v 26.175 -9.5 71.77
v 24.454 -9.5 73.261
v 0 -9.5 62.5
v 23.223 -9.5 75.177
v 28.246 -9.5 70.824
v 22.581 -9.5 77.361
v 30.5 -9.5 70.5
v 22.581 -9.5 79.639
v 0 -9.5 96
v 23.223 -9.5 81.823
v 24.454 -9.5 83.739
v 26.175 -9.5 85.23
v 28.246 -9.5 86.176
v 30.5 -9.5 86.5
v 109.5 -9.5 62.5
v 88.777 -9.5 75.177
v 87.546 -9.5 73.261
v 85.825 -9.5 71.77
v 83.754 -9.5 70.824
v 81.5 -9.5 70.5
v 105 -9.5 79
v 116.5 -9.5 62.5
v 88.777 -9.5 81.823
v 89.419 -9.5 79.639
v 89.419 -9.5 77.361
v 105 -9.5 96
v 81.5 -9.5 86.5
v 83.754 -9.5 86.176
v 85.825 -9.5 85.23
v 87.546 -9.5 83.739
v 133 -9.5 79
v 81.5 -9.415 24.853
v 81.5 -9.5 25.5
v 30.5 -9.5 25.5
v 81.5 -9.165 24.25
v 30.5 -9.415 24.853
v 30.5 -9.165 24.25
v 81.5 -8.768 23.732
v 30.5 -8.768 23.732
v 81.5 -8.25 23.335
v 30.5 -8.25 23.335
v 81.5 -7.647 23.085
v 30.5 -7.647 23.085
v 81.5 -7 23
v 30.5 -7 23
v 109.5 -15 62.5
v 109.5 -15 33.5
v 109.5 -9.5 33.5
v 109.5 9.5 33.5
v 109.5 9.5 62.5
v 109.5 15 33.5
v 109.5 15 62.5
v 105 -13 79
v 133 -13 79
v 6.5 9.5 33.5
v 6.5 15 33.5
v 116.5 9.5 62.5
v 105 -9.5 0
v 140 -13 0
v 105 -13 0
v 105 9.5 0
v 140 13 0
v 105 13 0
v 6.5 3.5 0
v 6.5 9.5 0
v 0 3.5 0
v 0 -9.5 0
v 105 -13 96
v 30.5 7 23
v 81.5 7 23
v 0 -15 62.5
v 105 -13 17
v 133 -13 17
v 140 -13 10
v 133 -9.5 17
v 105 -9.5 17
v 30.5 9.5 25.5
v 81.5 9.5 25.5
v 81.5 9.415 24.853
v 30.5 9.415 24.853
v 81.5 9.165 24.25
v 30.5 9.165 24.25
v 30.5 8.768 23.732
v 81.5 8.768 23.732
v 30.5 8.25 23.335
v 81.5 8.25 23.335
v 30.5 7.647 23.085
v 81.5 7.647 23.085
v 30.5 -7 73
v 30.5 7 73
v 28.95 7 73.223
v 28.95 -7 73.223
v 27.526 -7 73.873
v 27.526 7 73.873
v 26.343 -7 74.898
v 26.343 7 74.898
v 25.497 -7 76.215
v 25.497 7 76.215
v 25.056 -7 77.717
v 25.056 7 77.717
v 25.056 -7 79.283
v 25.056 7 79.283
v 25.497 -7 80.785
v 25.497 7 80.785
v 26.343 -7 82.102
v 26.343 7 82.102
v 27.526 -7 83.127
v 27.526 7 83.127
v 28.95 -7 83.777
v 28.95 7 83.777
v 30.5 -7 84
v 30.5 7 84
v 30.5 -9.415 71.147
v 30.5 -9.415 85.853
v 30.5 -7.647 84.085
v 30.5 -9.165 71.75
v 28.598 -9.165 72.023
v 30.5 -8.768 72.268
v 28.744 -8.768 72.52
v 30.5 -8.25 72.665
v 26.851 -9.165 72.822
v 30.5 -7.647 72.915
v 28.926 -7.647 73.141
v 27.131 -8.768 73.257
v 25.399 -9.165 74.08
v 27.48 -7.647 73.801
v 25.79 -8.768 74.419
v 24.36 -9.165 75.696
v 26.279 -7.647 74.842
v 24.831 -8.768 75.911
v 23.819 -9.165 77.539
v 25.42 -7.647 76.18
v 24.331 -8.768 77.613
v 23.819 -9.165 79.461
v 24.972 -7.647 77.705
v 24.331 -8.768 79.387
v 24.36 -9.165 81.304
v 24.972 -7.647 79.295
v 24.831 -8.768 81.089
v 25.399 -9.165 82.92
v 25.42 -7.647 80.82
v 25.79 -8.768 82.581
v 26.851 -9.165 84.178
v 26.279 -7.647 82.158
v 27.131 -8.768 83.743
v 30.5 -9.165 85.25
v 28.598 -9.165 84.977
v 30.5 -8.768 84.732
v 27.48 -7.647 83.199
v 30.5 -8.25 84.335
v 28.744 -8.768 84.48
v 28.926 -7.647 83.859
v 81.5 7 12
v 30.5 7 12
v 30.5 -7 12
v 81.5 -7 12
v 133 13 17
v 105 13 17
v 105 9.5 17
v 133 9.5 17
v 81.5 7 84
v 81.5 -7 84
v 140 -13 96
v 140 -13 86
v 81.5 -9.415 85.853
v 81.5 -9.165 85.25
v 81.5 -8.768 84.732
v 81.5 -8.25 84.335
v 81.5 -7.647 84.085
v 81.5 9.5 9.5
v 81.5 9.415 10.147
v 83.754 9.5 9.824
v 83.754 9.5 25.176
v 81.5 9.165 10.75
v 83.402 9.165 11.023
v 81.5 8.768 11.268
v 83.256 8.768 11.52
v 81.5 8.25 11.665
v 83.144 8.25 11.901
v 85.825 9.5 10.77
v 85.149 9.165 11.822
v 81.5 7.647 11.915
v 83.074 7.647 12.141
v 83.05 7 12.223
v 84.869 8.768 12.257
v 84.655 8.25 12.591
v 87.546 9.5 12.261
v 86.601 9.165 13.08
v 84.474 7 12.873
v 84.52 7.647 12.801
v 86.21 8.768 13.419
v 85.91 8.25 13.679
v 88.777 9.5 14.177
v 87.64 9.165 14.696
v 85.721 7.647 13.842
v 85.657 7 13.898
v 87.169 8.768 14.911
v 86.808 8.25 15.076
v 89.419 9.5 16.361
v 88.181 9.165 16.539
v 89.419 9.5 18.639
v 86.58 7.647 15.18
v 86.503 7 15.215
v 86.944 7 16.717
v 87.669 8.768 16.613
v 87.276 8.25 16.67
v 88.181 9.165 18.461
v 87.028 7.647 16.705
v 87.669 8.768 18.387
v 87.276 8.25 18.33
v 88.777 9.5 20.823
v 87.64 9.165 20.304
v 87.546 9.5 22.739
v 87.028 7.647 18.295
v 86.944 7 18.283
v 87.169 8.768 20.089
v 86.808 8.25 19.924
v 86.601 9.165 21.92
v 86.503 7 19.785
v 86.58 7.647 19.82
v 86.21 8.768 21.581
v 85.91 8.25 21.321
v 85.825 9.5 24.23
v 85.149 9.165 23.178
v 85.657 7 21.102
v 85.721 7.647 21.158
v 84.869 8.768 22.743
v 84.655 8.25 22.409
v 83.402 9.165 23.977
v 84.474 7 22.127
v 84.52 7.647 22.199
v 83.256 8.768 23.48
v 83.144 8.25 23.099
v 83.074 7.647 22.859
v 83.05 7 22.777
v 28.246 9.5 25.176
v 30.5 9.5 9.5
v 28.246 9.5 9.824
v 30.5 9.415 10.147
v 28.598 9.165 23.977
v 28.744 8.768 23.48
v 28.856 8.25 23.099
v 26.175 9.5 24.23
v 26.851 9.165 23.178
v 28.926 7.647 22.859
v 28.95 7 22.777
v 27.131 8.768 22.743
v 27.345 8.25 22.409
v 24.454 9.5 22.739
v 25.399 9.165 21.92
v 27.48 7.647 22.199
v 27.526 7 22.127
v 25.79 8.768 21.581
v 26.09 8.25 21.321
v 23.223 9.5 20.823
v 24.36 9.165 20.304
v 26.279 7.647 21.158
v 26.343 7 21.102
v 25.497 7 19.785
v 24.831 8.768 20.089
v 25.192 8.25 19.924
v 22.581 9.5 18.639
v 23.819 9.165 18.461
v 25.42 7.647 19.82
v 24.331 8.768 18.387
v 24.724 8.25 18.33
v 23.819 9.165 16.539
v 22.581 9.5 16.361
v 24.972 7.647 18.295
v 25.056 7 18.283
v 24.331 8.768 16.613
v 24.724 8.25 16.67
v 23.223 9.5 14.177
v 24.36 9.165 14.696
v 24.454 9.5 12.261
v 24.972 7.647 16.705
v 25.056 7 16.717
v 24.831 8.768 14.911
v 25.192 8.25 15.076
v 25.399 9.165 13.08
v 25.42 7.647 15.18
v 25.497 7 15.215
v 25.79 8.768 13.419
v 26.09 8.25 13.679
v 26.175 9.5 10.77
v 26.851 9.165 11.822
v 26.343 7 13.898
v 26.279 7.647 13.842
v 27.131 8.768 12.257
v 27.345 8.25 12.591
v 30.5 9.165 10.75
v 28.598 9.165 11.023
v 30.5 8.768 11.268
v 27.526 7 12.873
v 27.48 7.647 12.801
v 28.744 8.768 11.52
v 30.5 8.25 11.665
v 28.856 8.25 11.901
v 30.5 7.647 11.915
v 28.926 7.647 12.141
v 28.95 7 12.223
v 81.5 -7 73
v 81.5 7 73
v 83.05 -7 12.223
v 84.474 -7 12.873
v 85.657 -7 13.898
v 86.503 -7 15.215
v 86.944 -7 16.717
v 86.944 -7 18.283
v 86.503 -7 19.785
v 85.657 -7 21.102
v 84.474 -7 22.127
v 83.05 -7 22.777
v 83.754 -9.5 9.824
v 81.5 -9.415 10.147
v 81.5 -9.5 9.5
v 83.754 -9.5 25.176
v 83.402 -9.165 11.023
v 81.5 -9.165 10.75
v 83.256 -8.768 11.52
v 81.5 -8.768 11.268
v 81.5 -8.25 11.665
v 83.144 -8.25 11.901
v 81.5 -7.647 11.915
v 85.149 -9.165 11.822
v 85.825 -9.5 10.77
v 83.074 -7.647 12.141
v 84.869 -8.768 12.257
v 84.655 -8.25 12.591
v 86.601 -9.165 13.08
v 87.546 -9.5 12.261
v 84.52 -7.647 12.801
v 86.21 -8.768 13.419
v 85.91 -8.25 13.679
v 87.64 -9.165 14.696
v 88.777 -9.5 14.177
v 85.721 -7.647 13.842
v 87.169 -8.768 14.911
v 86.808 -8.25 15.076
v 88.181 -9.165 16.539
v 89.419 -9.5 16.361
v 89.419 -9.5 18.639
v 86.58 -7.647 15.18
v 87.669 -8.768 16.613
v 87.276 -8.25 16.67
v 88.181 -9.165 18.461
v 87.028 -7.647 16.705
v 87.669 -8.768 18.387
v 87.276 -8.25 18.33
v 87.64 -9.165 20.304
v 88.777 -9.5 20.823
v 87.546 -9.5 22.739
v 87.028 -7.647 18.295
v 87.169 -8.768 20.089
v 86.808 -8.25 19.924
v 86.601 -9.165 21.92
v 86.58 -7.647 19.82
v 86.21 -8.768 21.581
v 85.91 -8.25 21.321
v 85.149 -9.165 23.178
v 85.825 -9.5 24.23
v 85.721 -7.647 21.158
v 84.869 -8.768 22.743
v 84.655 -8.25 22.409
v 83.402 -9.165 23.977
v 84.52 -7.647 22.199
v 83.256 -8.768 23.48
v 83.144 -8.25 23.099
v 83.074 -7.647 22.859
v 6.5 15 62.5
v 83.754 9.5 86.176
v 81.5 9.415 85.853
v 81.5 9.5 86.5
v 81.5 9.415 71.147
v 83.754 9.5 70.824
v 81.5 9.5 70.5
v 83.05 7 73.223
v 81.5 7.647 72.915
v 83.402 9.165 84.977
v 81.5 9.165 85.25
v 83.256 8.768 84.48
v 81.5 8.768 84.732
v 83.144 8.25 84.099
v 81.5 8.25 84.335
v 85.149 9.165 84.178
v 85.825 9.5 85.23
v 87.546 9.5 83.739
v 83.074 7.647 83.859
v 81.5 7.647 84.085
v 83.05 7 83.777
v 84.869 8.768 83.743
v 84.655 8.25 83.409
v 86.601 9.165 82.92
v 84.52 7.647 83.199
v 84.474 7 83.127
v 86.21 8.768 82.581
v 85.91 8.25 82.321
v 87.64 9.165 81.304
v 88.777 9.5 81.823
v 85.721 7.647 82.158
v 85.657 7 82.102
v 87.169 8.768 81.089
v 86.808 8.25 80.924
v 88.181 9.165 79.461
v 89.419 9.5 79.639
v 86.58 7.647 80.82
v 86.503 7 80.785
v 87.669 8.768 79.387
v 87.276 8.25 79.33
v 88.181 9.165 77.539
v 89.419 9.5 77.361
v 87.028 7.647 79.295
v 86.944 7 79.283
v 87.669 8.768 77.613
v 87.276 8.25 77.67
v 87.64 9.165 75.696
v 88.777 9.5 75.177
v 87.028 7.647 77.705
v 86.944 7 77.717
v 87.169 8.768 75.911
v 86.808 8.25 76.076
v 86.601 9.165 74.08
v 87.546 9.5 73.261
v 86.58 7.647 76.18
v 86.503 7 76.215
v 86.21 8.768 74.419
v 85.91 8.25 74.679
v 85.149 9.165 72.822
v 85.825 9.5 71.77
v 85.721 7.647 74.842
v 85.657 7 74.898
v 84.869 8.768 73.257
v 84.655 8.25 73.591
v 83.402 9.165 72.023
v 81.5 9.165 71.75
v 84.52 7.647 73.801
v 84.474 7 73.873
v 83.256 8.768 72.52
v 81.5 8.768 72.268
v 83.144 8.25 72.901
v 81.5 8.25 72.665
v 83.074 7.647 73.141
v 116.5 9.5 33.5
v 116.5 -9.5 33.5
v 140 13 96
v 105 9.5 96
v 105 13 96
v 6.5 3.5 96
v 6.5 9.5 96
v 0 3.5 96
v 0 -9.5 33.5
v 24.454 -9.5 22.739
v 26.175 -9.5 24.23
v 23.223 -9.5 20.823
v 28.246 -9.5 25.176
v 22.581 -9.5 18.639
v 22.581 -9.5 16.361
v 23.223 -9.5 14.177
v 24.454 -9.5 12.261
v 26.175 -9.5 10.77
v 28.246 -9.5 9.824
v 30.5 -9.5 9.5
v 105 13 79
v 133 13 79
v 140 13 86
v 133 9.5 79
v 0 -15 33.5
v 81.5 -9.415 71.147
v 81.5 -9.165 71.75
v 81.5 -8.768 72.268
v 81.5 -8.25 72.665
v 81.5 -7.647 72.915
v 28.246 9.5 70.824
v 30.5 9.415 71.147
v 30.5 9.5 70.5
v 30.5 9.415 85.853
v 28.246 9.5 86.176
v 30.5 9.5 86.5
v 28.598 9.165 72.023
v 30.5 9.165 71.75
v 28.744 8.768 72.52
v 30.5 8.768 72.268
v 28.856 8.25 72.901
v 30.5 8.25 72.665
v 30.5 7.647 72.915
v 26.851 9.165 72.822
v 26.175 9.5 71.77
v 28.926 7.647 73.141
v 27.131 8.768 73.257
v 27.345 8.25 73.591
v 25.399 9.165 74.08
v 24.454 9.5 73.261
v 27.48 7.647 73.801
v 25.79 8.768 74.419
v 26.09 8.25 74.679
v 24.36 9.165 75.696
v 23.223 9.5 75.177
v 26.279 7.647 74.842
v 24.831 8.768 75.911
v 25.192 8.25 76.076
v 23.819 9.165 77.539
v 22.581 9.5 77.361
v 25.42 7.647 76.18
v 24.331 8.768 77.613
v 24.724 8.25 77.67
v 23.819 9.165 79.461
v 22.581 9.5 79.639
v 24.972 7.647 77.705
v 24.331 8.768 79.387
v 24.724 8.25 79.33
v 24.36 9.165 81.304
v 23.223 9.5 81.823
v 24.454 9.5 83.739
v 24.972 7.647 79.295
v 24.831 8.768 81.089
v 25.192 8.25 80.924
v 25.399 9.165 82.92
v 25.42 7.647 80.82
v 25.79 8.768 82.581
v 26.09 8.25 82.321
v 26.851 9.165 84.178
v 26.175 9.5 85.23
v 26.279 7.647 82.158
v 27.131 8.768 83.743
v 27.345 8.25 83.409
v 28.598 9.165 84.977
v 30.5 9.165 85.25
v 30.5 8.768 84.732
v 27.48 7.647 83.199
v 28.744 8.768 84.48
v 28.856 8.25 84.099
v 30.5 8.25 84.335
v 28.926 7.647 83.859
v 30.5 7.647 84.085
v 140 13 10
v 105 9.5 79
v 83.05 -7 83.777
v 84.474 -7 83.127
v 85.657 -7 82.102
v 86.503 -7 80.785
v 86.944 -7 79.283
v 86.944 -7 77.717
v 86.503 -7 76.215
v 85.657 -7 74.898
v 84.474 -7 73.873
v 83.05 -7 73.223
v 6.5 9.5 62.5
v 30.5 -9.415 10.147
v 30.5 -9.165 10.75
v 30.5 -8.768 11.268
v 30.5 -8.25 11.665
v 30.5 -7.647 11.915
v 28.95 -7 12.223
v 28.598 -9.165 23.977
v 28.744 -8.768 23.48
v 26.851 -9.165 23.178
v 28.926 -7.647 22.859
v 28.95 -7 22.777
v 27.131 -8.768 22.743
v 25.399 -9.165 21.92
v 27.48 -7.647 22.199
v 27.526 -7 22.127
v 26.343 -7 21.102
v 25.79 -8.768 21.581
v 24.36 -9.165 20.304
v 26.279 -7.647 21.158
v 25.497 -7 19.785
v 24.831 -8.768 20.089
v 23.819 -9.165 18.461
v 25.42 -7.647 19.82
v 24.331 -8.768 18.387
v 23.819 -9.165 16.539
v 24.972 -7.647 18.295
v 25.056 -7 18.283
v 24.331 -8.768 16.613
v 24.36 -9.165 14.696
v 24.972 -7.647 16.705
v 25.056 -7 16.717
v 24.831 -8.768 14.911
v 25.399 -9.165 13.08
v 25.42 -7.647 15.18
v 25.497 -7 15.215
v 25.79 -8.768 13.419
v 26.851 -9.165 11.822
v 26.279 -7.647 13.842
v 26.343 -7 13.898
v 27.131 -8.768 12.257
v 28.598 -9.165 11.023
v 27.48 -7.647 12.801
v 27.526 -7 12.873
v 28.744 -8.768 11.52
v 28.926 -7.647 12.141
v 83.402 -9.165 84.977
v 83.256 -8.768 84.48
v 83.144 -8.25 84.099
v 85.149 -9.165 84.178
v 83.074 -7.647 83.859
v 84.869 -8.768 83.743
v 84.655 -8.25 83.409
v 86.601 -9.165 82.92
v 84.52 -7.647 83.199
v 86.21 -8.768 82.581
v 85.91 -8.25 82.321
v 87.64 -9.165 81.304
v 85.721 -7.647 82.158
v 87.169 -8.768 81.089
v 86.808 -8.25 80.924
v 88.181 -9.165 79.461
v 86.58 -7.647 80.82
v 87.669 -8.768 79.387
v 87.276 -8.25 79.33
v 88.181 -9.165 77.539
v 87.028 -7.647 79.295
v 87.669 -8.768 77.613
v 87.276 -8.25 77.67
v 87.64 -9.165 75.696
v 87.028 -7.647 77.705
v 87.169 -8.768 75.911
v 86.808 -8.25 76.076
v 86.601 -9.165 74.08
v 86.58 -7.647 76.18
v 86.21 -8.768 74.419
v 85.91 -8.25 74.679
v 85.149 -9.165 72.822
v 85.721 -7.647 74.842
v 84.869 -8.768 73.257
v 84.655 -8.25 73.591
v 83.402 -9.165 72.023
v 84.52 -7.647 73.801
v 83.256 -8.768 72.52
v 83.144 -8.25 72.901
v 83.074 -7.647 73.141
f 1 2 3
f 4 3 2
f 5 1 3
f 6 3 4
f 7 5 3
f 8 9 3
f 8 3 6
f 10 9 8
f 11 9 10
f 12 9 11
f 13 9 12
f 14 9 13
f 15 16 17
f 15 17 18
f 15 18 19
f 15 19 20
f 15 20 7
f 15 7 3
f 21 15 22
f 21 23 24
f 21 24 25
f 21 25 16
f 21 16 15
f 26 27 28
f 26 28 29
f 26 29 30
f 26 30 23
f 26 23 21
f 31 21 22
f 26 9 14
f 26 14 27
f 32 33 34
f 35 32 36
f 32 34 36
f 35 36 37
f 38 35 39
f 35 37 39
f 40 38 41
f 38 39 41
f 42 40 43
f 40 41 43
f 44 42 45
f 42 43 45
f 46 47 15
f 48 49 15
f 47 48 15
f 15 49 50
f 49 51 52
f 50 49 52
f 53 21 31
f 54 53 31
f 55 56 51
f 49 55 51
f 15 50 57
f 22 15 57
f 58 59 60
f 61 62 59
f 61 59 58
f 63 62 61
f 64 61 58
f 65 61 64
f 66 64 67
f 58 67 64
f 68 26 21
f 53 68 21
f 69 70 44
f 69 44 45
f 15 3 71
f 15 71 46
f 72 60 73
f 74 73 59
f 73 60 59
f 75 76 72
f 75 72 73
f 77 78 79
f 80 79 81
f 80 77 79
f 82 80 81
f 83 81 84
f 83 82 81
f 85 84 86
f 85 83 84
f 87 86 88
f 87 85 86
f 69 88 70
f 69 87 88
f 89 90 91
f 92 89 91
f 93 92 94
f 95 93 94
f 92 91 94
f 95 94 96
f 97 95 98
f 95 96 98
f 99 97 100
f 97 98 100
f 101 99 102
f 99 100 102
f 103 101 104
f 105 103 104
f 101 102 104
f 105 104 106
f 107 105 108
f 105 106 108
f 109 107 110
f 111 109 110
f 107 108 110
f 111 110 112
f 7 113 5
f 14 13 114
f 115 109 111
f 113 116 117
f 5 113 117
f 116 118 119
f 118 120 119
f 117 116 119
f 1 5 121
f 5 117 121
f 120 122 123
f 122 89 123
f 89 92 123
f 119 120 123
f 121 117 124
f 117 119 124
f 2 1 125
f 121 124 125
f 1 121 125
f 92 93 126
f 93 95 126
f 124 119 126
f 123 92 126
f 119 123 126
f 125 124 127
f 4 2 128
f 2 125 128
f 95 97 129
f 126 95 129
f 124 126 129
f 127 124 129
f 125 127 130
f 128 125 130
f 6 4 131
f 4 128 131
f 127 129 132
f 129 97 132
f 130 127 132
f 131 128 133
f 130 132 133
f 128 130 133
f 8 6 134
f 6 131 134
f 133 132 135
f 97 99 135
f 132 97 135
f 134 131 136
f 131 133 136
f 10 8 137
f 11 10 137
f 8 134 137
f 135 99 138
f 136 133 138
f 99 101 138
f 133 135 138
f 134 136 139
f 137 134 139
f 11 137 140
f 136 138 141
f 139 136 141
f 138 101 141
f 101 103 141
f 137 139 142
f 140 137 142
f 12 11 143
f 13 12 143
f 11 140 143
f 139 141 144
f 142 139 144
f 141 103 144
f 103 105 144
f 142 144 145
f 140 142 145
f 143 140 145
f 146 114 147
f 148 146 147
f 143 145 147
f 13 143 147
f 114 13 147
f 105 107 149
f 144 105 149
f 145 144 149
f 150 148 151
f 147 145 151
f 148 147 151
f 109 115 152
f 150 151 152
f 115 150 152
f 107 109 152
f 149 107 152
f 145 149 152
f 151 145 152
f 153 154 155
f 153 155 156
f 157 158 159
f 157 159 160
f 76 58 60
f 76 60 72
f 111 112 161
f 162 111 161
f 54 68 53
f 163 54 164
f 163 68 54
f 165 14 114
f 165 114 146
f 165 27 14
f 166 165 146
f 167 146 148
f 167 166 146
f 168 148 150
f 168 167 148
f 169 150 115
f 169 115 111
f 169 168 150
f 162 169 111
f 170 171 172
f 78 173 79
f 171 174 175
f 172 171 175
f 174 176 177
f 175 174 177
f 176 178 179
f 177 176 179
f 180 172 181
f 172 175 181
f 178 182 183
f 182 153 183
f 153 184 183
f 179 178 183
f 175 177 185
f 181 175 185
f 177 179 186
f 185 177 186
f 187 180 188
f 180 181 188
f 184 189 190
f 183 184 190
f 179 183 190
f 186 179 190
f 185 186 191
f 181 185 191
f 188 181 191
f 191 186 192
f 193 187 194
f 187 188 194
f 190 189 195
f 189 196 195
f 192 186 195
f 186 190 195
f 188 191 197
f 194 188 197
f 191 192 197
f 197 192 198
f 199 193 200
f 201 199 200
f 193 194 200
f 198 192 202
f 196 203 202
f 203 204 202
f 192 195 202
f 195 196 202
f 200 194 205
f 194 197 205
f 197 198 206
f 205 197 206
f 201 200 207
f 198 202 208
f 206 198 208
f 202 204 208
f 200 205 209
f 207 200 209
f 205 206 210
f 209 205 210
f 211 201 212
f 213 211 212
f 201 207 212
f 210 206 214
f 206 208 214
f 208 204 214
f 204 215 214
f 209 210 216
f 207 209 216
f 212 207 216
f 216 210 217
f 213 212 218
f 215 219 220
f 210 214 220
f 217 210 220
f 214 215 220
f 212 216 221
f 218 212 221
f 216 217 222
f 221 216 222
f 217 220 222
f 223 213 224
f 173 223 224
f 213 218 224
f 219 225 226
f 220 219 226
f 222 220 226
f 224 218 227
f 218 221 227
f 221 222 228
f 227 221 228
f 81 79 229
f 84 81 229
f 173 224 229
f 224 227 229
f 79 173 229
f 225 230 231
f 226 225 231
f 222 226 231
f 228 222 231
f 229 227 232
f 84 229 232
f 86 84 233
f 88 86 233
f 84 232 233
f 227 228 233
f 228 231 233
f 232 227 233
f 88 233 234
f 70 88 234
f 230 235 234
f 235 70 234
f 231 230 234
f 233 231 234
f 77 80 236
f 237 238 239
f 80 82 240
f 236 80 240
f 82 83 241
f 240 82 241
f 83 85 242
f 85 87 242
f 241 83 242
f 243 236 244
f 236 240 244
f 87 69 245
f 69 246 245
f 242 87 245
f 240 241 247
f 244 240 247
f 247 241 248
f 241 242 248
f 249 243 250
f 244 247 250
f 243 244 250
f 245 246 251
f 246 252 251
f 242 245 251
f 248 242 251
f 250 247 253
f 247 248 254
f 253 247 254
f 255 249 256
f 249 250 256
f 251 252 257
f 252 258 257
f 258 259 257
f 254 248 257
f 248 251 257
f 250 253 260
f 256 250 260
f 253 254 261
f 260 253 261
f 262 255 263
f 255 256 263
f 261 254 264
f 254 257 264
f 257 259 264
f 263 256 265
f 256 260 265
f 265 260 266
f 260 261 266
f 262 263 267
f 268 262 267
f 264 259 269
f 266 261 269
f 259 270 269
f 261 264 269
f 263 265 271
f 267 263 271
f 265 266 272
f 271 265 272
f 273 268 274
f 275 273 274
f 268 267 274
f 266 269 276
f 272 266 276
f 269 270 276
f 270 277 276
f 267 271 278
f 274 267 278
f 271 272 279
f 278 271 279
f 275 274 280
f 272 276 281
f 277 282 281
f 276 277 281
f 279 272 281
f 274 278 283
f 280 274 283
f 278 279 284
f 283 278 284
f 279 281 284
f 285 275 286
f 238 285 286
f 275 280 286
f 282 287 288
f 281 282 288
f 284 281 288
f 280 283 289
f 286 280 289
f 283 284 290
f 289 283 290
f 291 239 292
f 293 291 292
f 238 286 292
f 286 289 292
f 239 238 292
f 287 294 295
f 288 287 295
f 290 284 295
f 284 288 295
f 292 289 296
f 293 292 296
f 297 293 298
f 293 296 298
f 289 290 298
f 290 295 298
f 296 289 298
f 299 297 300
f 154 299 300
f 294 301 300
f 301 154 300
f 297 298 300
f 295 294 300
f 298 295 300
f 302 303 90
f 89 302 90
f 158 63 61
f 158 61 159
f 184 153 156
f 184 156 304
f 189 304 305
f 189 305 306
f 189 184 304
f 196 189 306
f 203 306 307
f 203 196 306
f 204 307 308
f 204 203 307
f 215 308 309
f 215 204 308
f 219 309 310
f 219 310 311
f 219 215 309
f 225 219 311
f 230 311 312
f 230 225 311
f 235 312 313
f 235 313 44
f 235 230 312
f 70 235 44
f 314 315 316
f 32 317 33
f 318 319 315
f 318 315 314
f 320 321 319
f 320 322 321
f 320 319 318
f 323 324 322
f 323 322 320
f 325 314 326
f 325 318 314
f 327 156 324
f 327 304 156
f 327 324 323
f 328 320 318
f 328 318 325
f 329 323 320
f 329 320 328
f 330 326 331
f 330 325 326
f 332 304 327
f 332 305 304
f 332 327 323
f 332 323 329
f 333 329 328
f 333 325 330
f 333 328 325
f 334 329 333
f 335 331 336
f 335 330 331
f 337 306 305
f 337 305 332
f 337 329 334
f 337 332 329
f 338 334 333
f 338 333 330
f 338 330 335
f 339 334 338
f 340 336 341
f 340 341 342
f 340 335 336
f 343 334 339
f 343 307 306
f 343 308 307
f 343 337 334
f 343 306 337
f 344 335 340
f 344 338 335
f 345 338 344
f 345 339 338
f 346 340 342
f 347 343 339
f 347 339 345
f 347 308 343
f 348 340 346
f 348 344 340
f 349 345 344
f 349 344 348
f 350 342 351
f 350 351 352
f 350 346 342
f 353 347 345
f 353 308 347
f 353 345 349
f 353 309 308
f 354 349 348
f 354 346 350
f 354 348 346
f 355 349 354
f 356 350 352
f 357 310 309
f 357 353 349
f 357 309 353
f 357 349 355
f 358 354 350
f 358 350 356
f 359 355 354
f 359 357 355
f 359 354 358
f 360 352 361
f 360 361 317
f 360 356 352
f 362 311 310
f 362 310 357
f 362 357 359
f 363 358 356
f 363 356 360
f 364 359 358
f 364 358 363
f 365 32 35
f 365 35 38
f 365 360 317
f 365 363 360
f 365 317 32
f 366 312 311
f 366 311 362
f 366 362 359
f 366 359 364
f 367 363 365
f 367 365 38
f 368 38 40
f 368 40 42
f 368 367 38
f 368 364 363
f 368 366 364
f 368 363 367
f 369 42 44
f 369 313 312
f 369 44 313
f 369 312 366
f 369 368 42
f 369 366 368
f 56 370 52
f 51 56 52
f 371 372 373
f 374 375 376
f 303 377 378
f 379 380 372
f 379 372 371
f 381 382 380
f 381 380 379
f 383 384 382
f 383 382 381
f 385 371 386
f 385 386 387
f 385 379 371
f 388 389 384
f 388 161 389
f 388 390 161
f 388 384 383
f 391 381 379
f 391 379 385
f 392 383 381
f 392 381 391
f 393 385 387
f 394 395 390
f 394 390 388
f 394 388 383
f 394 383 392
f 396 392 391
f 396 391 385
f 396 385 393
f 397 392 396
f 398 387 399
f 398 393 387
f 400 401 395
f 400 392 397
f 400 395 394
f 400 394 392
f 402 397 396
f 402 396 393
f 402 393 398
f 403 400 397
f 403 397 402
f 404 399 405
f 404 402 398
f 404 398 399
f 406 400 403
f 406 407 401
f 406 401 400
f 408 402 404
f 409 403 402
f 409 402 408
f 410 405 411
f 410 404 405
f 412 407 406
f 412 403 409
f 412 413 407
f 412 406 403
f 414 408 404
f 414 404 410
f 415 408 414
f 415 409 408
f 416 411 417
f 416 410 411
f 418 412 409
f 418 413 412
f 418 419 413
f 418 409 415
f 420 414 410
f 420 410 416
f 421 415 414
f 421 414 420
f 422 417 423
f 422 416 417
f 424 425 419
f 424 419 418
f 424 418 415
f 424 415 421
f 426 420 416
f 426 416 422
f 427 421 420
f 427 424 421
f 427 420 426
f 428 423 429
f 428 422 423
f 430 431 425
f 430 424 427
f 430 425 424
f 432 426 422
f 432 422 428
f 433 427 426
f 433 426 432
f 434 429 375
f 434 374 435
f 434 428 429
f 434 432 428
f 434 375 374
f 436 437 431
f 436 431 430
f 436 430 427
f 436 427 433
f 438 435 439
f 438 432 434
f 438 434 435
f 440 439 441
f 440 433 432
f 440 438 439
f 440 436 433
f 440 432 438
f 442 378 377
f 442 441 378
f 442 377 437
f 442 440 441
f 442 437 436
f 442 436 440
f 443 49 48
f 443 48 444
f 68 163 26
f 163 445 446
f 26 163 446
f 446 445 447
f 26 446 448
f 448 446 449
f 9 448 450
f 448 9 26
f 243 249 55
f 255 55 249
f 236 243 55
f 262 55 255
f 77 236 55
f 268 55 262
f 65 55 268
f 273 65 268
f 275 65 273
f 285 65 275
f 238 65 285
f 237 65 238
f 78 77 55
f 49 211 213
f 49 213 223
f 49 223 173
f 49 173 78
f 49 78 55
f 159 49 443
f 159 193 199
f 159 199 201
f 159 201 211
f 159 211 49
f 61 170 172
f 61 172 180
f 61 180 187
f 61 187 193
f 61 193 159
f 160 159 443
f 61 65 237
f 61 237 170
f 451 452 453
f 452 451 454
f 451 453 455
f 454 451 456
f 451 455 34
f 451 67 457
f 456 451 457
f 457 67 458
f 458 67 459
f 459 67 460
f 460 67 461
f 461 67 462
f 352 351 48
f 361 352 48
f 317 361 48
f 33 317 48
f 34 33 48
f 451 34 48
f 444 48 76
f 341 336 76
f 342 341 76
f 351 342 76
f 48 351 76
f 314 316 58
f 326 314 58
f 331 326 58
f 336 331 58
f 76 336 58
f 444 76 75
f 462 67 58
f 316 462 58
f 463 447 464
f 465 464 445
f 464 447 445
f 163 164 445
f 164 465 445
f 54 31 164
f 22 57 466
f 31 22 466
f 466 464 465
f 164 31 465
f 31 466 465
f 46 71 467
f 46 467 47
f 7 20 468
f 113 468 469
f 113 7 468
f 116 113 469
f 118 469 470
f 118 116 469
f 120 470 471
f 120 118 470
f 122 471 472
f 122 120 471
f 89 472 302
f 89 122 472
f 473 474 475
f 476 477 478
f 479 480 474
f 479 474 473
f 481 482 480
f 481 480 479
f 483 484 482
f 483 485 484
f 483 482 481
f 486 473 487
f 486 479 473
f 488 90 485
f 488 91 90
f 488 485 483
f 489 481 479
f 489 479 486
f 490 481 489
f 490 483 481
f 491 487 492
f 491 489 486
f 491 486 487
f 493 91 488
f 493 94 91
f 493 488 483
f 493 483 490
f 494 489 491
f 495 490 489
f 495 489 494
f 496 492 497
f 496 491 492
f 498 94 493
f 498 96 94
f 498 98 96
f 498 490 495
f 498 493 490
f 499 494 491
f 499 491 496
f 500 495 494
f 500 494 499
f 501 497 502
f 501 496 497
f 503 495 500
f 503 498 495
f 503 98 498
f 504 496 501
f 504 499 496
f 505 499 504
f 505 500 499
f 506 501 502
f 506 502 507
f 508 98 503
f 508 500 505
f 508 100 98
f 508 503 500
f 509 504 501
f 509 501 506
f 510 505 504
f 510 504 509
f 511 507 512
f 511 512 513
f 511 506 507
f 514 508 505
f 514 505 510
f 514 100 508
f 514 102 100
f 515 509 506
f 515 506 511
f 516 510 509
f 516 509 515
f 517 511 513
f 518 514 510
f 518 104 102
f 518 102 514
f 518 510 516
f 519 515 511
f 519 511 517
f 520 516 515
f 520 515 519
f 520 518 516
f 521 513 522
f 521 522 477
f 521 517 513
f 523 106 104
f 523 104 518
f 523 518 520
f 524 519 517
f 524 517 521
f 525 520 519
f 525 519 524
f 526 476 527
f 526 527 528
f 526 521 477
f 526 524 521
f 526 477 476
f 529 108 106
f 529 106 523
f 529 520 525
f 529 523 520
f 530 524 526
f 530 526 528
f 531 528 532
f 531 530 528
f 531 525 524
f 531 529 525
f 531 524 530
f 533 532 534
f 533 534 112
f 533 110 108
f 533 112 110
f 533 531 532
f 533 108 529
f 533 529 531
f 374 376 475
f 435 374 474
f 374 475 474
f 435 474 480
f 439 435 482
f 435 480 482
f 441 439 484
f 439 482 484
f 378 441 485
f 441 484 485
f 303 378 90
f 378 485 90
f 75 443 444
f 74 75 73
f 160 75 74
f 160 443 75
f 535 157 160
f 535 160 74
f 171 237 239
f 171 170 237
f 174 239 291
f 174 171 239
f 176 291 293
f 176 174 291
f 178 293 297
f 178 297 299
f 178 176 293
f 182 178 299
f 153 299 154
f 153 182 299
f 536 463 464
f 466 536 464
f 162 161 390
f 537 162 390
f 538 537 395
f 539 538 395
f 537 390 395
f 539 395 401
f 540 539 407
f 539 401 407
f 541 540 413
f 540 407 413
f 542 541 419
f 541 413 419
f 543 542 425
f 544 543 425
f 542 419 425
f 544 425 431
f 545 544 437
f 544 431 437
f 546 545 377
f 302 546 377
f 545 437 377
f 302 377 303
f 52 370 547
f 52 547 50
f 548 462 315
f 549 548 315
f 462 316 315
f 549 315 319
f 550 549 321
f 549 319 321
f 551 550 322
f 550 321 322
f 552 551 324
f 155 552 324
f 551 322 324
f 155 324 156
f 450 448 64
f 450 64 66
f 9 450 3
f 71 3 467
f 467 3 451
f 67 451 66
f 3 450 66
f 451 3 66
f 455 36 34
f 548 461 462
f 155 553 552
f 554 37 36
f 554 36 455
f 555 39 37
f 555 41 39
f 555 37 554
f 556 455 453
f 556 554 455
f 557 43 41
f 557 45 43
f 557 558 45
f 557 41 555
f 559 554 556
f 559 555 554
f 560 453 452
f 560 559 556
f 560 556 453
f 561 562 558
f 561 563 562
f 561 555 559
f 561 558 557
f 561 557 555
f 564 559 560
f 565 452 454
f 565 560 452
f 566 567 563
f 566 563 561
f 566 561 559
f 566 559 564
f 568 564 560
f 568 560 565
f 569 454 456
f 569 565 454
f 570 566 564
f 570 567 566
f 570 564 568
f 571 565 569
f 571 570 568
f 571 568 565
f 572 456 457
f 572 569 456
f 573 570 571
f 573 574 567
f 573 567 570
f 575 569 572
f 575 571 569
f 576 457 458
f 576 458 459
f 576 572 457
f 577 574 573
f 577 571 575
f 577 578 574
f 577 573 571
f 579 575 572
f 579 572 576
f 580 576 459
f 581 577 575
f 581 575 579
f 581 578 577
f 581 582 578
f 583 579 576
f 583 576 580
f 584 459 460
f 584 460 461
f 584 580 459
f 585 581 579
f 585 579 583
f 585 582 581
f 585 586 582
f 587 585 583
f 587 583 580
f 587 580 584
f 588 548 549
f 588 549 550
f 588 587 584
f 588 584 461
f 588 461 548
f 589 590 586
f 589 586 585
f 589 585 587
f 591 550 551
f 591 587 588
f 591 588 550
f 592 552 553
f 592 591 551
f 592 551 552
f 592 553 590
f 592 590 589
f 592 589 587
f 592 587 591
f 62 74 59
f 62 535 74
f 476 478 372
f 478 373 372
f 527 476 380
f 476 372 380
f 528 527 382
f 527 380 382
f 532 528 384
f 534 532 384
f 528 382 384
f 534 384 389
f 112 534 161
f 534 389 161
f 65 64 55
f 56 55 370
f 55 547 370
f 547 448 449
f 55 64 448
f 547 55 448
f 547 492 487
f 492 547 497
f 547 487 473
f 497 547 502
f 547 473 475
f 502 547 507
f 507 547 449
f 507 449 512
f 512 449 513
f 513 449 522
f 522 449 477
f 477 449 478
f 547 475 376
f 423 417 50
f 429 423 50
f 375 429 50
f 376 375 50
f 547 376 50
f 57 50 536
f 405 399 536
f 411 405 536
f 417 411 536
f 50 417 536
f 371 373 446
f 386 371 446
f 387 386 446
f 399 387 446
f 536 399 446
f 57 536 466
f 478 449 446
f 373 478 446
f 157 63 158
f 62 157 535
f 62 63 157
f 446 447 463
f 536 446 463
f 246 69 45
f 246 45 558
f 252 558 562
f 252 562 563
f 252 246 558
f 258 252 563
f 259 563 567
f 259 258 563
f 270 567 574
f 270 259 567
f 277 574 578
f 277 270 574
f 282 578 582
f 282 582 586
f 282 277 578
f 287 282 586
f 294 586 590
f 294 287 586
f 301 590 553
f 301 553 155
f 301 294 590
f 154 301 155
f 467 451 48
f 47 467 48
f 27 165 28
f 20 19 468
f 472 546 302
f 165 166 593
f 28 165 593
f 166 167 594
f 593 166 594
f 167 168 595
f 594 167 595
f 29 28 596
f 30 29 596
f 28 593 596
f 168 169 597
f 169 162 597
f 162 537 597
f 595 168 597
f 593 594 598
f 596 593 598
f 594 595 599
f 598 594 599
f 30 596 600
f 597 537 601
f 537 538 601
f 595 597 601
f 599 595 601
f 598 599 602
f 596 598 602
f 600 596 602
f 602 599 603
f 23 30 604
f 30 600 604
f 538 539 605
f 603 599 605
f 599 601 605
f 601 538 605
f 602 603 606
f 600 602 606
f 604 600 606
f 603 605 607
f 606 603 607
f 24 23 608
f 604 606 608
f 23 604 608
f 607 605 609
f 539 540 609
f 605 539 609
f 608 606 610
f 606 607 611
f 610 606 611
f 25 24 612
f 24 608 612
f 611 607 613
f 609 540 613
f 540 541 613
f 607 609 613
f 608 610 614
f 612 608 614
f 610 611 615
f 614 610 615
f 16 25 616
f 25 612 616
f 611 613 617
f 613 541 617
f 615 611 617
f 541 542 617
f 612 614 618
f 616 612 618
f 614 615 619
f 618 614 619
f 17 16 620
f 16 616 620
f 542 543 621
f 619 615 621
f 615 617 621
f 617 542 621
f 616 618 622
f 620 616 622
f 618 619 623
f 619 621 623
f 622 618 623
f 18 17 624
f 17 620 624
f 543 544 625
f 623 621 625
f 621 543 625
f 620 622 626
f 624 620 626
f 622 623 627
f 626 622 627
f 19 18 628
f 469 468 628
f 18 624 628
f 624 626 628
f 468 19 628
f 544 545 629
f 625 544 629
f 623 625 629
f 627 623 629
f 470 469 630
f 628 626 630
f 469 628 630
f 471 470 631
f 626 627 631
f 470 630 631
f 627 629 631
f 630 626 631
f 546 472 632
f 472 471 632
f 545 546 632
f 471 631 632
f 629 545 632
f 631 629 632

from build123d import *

# Parameters (mm, degrees)
SKETCH1_W           = 109.5
SKETCH1_H           = 14.5
BOSS_EXTRUDE5_DEPTH = 15
BOSS_EXTRUDE6_DEPTH = 9.5
BOSS_EXTRUDE8_DEPTH = 13
SKETCH4_W           = 6.5
SKETCH4_H           = 11.5
CUT_EXTRUDE3_DEPTH  = 65.5
FILLET2_R           = 2.5


with BuildPart() as part:
    # Sketch1 → Boss-Extrude5 (new, symmetric)
    with BuildSketch(Plane(origin=(0, 0, 0), x_dir=(1, 0, 0), z_dir=(0, 1, 0))):
        with Locations((54.75, -40.75)):
            Rectangle(SKETCH1_W, SKETCH1_H)
    extrude(amount=BOSS_EXTRUDE5_DEPTH, both=True)

    # Sketch1<3> → Boss-Extrude6 (add, symmetric)
    with BuildSketch(Plane(origin=(0, 0, 0), x_dir=(1, 0, 0), z_dir=(0, 1, 0))):
        Polygon((105, 0), (0, 0), (0, -33.5), (109.5, -33.5), (116.5, -33.5), (133, -17), (105, -17), align=None)
        with BuildLine():
            ThreePointArc((30.5, -23), (25, -17.5), (30.5, -12))
            Line((30.5, -12), (81.5, -12))
            ThreePointArc((81.5, -12), (87, -17.5), (81.5, -23))
            Line((81.5, -23), (30.5, -23))
        make_face(mode=Mode.SUBTRACT)
    extrude(amount=BOSS_EXTRUDE6_DEPTH, both=True)

    # Sketch1<5> → Boss-Extrude8 (add, symmetric)
    with BuildSketch(Plane(origin=(0, 0, 0), x_dir=(1, 0, 0), z_dir=(0, 1, 0))):
        Polygon((140, 0), (105, 0), (105, -17), (133, -17), (140, -10), align=None)
    extrude(amount=BOSS_EXTRUDE8_DEPTH, both=True)

    # Sketch4 → Cut-Extrude3 (cut, symmetric)
    with BuildSketch(Plane(origin=(0, 0, 0), x_dir=(-1, 0, 0), z_dir=(0, 0, -1))):
        with Locations((-3.25, 9.25)):
            Rectangle(SKETCH4_W, SKETCH4_H)
    extrude(amount=CUT_EXTRUDE3_DEPTH, both=True, mode=Mode.SUBTRACT)

    # Fillet2
    fillet2_edges = [part.edges().sort_by_distance(p)[0] for p in [
        (87, 9.5, 17.5),
        (56, 9.5, 23),
        (25, 9.5, 17.5),
        (56, -9.5, 12),
        (56, 9.5, 12),
        (87, -9.5, 17.5),
        (25, -9.5, 17.5),
        (56, -9.5, 23),
    ]]
    fillet(fillet2_edges, radius=FILLET2_R)

    # Mirror2: part across plane


with BuildPart() as part_1:
    add(part.part)
    add(part.part.mirror(Plane(origin=(0, 15, 48), x_dir=(1, 0, 0), z_dir=(0, 0, -1))))


solid = part_1.part
